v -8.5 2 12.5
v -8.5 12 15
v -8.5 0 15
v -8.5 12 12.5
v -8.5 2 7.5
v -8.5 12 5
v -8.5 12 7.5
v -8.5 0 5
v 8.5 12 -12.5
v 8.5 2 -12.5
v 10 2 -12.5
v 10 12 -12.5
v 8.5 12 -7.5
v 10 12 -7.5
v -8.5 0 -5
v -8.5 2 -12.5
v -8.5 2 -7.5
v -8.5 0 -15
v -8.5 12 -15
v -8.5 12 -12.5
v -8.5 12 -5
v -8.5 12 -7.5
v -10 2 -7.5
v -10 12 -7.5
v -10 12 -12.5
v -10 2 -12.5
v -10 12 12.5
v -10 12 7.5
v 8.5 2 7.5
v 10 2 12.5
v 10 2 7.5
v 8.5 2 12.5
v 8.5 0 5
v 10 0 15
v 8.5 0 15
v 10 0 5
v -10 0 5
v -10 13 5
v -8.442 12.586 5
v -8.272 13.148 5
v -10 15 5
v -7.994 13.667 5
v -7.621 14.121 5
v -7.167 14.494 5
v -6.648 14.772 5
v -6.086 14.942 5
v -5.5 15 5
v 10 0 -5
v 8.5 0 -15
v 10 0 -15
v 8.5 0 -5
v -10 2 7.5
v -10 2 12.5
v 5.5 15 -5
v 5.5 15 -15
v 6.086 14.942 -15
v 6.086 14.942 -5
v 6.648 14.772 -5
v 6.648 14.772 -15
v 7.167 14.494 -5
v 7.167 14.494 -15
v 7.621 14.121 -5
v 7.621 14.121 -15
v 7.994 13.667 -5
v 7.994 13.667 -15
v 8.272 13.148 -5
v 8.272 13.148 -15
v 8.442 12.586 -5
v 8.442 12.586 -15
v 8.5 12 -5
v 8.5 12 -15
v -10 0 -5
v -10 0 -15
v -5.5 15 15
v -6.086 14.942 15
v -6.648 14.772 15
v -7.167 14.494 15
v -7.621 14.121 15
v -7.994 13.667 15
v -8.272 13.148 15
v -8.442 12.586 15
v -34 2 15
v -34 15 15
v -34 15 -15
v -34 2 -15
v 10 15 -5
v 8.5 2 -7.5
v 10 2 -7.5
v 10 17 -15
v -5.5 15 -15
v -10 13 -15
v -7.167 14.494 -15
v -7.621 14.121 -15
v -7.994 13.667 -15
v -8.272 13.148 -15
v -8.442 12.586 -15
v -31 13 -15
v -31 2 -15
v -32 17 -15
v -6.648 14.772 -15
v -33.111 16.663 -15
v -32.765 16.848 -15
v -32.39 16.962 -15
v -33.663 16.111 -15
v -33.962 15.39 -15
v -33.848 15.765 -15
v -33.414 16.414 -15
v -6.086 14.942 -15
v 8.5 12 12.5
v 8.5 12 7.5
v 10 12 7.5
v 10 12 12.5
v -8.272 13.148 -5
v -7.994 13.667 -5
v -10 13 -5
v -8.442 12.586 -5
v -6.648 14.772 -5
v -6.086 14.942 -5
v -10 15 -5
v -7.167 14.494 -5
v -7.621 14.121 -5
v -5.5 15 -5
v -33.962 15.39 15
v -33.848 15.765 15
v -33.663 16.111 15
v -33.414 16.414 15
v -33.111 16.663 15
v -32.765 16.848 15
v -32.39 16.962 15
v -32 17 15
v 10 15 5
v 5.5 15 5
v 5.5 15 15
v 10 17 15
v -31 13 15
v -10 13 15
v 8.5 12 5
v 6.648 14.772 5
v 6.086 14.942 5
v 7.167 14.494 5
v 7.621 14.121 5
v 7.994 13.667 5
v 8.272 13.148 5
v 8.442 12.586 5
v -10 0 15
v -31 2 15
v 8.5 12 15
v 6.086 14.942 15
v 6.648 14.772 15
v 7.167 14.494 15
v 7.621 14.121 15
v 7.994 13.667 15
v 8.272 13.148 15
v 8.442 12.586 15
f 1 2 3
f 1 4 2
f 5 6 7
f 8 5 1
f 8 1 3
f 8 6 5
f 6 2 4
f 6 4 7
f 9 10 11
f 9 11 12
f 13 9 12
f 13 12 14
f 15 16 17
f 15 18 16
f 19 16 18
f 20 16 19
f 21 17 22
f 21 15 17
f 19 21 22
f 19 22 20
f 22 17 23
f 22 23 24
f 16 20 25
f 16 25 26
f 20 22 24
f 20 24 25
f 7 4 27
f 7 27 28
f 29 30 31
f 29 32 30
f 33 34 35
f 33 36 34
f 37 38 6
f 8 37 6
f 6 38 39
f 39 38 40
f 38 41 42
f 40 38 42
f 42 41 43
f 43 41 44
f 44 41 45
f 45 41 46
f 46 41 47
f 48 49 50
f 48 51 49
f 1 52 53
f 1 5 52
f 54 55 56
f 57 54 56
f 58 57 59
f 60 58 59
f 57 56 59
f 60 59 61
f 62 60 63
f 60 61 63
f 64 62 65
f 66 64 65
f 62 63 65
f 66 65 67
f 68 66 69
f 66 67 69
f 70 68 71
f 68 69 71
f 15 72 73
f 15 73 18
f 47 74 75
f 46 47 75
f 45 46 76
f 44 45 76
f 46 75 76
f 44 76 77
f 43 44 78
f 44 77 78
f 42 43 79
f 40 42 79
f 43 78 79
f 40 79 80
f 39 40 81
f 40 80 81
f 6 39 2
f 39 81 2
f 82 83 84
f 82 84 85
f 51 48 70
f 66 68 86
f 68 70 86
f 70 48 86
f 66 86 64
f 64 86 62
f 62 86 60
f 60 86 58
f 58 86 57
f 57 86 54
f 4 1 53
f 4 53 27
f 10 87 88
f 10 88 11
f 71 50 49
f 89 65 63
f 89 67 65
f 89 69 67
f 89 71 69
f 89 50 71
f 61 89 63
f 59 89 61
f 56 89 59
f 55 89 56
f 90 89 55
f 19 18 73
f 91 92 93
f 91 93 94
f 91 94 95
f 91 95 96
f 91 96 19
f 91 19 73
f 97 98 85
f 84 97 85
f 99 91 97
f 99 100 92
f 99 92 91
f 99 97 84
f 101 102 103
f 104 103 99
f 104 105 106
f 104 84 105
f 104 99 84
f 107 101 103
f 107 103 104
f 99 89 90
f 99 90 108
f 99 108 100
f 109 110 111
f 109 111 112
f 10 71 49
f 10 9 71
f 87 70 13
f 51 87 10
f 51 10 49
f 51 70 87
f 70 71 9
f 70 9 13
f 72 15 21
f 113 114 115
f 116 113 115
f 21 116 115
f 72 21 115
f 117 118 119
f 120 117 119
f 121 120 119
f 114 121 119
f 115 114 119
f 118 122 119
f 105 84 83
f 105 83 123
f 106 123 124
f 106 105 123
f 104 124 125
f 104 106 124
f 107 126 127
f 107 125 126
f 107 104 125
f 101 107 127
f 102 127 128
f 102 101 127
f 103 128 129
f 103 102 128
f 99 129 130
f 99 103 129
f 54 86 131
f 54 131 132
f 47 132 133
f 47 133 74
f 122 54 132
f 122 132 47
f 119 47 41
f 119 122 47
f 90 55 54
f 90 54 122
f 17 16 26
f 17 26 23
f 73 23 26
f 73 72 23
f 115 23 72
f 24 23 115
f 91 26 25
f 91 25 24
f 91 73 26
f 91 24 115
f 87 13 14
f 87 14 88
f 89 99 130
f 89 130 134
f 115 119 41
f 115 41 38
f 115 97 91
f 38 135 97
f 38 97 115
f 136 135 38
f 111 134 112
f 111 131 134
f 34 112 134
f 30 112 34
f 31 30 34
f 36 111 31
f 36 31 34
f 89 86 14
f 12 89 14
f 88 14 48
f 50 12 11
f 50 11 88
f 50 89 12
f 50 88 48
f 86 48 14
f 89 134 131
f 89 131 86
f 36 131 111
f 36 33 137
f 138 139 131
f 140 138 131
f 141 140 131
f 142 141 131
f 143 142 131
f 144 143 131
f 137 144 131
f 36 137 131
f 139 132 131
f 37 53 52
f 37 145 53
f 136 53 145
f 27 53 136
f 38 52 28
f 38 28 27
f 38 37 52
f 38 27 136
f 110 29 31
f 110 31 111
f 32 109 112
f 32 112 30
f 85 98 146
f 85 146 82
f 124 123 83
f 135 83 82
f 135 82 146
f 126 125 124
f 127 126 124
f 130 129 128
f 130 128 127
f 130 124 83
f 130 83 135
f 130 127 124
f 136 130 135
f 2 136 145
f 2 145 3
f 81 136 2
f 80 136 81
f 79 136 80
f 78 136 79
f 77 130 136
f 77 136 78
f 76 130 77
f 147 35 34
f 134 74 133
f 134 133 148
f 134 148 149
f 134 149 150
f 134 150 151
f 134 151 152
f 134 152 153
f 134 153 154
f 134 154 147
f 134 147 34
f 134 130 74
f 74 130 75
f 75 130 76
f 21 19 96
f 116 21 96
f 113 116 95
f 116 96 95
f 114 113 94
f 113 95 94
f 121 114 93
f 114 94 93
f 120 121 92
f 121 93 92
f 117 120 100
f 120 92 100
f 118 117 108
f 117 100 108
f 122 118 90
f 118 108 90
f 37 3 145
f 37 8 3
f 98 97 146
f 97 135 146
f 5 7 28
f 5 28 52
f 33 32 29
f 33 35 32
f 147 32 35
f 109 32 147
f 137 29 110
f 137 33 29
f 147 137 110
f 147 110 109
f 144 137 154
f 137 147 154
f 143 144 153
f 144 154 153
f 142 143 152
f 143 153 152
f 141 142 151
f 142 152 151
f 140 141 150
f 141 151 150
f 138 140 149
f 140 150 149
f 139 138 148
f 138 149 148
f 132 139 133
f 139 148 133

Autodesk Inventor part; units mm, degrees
ref_plane "YZ Plane" through (0, 0, 0) normal (1, 0, 0) x (0, 1, 0)
ref_plane "XZ Plane" through (0, 0, 0) normal (0, 1, 0) x (-1, 0, 0)
ref_plane "XY Plane" through (0, 0, 0) normal (0, 0, 1) x (1, 0, 0)
sketch "スケッチ1" plane through (0, 0, 0) normal (0, 0, 1) x (1, 0, 0)
  line L0 (-10, 17) -> (0, 17)
  line L1 (0, 17) -> (0, 15)
  line L2 (0, 15) -> (-10, 15)
  line L3 (-10, 15) -> (-10, 17)
  line L4 (0, -3.4) -> (0, 20.4) projected
  point P0 (0, 0)
  dimension "d0" = 10
  dimension "d1" = 2
  dimension "d2" = 15
extrude "押し出し1" add sketch "スケッチ1" along normal blind 5
sketch "スケッチ2" plane through (0, 0, 5) normal (0, 0, 1) x (1, 0, 0)
  line L0 (0, 17) -> (-10, 17) projected
  line L1 (-10, 17) -> (-8.5, 17)
  line L2 (-8.5, 17) -> (-8.5, 0)
  line L3 (-8.5, 0) -> (-10, 0)
  line L4 (-10, 0) -> (-10, 17)
  line L5 (-10, 15) -> (0, 15) projected
  line L6 (0, 15) -> (0, 17) projected
  line L7 (0, 17) -> (-10, 17) projected
  line L8 (-10, 17) -> (-10, 15) projected
  point P0 (0, 0)
  point P1 (-8.5, 15)
  dimension "d5" = 1.5
extrude "押し出し2" add sketch "スケッチ2" along normal blind 10
sketch "スケッチ3" plane through (-8.5, 0, 5) normal (1, 0, 0) x (0, 0, -1)
  line L0 (-7.5, 12) -> (-2.5, 12)
  line L1 (-2.5, 12) -> (-2.5, 2)
  line L2 (-2.5, 2) -> (-7.5, 2)
  line L3 (-7.5, 2) -> (-7.5, 12)
  line L4 (0, 0) -> (-10, 0) projected
  line L5 (0, 15) -> (-10, 15) projected
  point P0 (5, 0)
  point P1 (-5, 2)
  point P2 (-5, 0)
  dimension "d8" = 2
  dimension "d9" = 5
  dimension "d13" = 3
extrude "押し出し3" cut sketch "スケッチ3" against normal through all
fillet "フィレット1" radius 3 1 edges at (-8.5, 15, 10)
mirror "ミラー1" about plane through (0, 15, 0) normal (1, 0, 0)
mirror "ミラー2" about plane through (-5, 16, 0) normal (0, 0, -1)
sketch "スケッチ4" plane through (0, 0, 15) normal (0, 0, 1) x (1, 0, 0)
  line L0 (-10, 17) -> (-10, 0) projected
  line L1 (-10, 17) -> (-34, 17)
  line L2 (-34, 17) -> (-34, 13)
  line L3 (-34, 13) -> (-10, 13)
  line L4 (-10, 13) -> (-10, 17)
  line L5 (-34, 17) -> (-31, 17)
  line L6 (-31, 17) -> (-31, 2)
  line L7 (-31, 2) -> (-34, 2)
  line L8 (-34, 2) -> (-34, 17)
  point P0 (0, 0)
  point P1 (-31, 13)
  dimension "d14" = 4
  dimension "d15" = 3
  dimension "d16" = 21
  dimension "d17" = 15
extrude "押し出し4" add sketch "スケッチ4" against normal up to surface (30 mm away)
fillet "フィレット2" radius 2 1 edges at (-34, 17, 0)
properties part number "connetcor_female_cover"
